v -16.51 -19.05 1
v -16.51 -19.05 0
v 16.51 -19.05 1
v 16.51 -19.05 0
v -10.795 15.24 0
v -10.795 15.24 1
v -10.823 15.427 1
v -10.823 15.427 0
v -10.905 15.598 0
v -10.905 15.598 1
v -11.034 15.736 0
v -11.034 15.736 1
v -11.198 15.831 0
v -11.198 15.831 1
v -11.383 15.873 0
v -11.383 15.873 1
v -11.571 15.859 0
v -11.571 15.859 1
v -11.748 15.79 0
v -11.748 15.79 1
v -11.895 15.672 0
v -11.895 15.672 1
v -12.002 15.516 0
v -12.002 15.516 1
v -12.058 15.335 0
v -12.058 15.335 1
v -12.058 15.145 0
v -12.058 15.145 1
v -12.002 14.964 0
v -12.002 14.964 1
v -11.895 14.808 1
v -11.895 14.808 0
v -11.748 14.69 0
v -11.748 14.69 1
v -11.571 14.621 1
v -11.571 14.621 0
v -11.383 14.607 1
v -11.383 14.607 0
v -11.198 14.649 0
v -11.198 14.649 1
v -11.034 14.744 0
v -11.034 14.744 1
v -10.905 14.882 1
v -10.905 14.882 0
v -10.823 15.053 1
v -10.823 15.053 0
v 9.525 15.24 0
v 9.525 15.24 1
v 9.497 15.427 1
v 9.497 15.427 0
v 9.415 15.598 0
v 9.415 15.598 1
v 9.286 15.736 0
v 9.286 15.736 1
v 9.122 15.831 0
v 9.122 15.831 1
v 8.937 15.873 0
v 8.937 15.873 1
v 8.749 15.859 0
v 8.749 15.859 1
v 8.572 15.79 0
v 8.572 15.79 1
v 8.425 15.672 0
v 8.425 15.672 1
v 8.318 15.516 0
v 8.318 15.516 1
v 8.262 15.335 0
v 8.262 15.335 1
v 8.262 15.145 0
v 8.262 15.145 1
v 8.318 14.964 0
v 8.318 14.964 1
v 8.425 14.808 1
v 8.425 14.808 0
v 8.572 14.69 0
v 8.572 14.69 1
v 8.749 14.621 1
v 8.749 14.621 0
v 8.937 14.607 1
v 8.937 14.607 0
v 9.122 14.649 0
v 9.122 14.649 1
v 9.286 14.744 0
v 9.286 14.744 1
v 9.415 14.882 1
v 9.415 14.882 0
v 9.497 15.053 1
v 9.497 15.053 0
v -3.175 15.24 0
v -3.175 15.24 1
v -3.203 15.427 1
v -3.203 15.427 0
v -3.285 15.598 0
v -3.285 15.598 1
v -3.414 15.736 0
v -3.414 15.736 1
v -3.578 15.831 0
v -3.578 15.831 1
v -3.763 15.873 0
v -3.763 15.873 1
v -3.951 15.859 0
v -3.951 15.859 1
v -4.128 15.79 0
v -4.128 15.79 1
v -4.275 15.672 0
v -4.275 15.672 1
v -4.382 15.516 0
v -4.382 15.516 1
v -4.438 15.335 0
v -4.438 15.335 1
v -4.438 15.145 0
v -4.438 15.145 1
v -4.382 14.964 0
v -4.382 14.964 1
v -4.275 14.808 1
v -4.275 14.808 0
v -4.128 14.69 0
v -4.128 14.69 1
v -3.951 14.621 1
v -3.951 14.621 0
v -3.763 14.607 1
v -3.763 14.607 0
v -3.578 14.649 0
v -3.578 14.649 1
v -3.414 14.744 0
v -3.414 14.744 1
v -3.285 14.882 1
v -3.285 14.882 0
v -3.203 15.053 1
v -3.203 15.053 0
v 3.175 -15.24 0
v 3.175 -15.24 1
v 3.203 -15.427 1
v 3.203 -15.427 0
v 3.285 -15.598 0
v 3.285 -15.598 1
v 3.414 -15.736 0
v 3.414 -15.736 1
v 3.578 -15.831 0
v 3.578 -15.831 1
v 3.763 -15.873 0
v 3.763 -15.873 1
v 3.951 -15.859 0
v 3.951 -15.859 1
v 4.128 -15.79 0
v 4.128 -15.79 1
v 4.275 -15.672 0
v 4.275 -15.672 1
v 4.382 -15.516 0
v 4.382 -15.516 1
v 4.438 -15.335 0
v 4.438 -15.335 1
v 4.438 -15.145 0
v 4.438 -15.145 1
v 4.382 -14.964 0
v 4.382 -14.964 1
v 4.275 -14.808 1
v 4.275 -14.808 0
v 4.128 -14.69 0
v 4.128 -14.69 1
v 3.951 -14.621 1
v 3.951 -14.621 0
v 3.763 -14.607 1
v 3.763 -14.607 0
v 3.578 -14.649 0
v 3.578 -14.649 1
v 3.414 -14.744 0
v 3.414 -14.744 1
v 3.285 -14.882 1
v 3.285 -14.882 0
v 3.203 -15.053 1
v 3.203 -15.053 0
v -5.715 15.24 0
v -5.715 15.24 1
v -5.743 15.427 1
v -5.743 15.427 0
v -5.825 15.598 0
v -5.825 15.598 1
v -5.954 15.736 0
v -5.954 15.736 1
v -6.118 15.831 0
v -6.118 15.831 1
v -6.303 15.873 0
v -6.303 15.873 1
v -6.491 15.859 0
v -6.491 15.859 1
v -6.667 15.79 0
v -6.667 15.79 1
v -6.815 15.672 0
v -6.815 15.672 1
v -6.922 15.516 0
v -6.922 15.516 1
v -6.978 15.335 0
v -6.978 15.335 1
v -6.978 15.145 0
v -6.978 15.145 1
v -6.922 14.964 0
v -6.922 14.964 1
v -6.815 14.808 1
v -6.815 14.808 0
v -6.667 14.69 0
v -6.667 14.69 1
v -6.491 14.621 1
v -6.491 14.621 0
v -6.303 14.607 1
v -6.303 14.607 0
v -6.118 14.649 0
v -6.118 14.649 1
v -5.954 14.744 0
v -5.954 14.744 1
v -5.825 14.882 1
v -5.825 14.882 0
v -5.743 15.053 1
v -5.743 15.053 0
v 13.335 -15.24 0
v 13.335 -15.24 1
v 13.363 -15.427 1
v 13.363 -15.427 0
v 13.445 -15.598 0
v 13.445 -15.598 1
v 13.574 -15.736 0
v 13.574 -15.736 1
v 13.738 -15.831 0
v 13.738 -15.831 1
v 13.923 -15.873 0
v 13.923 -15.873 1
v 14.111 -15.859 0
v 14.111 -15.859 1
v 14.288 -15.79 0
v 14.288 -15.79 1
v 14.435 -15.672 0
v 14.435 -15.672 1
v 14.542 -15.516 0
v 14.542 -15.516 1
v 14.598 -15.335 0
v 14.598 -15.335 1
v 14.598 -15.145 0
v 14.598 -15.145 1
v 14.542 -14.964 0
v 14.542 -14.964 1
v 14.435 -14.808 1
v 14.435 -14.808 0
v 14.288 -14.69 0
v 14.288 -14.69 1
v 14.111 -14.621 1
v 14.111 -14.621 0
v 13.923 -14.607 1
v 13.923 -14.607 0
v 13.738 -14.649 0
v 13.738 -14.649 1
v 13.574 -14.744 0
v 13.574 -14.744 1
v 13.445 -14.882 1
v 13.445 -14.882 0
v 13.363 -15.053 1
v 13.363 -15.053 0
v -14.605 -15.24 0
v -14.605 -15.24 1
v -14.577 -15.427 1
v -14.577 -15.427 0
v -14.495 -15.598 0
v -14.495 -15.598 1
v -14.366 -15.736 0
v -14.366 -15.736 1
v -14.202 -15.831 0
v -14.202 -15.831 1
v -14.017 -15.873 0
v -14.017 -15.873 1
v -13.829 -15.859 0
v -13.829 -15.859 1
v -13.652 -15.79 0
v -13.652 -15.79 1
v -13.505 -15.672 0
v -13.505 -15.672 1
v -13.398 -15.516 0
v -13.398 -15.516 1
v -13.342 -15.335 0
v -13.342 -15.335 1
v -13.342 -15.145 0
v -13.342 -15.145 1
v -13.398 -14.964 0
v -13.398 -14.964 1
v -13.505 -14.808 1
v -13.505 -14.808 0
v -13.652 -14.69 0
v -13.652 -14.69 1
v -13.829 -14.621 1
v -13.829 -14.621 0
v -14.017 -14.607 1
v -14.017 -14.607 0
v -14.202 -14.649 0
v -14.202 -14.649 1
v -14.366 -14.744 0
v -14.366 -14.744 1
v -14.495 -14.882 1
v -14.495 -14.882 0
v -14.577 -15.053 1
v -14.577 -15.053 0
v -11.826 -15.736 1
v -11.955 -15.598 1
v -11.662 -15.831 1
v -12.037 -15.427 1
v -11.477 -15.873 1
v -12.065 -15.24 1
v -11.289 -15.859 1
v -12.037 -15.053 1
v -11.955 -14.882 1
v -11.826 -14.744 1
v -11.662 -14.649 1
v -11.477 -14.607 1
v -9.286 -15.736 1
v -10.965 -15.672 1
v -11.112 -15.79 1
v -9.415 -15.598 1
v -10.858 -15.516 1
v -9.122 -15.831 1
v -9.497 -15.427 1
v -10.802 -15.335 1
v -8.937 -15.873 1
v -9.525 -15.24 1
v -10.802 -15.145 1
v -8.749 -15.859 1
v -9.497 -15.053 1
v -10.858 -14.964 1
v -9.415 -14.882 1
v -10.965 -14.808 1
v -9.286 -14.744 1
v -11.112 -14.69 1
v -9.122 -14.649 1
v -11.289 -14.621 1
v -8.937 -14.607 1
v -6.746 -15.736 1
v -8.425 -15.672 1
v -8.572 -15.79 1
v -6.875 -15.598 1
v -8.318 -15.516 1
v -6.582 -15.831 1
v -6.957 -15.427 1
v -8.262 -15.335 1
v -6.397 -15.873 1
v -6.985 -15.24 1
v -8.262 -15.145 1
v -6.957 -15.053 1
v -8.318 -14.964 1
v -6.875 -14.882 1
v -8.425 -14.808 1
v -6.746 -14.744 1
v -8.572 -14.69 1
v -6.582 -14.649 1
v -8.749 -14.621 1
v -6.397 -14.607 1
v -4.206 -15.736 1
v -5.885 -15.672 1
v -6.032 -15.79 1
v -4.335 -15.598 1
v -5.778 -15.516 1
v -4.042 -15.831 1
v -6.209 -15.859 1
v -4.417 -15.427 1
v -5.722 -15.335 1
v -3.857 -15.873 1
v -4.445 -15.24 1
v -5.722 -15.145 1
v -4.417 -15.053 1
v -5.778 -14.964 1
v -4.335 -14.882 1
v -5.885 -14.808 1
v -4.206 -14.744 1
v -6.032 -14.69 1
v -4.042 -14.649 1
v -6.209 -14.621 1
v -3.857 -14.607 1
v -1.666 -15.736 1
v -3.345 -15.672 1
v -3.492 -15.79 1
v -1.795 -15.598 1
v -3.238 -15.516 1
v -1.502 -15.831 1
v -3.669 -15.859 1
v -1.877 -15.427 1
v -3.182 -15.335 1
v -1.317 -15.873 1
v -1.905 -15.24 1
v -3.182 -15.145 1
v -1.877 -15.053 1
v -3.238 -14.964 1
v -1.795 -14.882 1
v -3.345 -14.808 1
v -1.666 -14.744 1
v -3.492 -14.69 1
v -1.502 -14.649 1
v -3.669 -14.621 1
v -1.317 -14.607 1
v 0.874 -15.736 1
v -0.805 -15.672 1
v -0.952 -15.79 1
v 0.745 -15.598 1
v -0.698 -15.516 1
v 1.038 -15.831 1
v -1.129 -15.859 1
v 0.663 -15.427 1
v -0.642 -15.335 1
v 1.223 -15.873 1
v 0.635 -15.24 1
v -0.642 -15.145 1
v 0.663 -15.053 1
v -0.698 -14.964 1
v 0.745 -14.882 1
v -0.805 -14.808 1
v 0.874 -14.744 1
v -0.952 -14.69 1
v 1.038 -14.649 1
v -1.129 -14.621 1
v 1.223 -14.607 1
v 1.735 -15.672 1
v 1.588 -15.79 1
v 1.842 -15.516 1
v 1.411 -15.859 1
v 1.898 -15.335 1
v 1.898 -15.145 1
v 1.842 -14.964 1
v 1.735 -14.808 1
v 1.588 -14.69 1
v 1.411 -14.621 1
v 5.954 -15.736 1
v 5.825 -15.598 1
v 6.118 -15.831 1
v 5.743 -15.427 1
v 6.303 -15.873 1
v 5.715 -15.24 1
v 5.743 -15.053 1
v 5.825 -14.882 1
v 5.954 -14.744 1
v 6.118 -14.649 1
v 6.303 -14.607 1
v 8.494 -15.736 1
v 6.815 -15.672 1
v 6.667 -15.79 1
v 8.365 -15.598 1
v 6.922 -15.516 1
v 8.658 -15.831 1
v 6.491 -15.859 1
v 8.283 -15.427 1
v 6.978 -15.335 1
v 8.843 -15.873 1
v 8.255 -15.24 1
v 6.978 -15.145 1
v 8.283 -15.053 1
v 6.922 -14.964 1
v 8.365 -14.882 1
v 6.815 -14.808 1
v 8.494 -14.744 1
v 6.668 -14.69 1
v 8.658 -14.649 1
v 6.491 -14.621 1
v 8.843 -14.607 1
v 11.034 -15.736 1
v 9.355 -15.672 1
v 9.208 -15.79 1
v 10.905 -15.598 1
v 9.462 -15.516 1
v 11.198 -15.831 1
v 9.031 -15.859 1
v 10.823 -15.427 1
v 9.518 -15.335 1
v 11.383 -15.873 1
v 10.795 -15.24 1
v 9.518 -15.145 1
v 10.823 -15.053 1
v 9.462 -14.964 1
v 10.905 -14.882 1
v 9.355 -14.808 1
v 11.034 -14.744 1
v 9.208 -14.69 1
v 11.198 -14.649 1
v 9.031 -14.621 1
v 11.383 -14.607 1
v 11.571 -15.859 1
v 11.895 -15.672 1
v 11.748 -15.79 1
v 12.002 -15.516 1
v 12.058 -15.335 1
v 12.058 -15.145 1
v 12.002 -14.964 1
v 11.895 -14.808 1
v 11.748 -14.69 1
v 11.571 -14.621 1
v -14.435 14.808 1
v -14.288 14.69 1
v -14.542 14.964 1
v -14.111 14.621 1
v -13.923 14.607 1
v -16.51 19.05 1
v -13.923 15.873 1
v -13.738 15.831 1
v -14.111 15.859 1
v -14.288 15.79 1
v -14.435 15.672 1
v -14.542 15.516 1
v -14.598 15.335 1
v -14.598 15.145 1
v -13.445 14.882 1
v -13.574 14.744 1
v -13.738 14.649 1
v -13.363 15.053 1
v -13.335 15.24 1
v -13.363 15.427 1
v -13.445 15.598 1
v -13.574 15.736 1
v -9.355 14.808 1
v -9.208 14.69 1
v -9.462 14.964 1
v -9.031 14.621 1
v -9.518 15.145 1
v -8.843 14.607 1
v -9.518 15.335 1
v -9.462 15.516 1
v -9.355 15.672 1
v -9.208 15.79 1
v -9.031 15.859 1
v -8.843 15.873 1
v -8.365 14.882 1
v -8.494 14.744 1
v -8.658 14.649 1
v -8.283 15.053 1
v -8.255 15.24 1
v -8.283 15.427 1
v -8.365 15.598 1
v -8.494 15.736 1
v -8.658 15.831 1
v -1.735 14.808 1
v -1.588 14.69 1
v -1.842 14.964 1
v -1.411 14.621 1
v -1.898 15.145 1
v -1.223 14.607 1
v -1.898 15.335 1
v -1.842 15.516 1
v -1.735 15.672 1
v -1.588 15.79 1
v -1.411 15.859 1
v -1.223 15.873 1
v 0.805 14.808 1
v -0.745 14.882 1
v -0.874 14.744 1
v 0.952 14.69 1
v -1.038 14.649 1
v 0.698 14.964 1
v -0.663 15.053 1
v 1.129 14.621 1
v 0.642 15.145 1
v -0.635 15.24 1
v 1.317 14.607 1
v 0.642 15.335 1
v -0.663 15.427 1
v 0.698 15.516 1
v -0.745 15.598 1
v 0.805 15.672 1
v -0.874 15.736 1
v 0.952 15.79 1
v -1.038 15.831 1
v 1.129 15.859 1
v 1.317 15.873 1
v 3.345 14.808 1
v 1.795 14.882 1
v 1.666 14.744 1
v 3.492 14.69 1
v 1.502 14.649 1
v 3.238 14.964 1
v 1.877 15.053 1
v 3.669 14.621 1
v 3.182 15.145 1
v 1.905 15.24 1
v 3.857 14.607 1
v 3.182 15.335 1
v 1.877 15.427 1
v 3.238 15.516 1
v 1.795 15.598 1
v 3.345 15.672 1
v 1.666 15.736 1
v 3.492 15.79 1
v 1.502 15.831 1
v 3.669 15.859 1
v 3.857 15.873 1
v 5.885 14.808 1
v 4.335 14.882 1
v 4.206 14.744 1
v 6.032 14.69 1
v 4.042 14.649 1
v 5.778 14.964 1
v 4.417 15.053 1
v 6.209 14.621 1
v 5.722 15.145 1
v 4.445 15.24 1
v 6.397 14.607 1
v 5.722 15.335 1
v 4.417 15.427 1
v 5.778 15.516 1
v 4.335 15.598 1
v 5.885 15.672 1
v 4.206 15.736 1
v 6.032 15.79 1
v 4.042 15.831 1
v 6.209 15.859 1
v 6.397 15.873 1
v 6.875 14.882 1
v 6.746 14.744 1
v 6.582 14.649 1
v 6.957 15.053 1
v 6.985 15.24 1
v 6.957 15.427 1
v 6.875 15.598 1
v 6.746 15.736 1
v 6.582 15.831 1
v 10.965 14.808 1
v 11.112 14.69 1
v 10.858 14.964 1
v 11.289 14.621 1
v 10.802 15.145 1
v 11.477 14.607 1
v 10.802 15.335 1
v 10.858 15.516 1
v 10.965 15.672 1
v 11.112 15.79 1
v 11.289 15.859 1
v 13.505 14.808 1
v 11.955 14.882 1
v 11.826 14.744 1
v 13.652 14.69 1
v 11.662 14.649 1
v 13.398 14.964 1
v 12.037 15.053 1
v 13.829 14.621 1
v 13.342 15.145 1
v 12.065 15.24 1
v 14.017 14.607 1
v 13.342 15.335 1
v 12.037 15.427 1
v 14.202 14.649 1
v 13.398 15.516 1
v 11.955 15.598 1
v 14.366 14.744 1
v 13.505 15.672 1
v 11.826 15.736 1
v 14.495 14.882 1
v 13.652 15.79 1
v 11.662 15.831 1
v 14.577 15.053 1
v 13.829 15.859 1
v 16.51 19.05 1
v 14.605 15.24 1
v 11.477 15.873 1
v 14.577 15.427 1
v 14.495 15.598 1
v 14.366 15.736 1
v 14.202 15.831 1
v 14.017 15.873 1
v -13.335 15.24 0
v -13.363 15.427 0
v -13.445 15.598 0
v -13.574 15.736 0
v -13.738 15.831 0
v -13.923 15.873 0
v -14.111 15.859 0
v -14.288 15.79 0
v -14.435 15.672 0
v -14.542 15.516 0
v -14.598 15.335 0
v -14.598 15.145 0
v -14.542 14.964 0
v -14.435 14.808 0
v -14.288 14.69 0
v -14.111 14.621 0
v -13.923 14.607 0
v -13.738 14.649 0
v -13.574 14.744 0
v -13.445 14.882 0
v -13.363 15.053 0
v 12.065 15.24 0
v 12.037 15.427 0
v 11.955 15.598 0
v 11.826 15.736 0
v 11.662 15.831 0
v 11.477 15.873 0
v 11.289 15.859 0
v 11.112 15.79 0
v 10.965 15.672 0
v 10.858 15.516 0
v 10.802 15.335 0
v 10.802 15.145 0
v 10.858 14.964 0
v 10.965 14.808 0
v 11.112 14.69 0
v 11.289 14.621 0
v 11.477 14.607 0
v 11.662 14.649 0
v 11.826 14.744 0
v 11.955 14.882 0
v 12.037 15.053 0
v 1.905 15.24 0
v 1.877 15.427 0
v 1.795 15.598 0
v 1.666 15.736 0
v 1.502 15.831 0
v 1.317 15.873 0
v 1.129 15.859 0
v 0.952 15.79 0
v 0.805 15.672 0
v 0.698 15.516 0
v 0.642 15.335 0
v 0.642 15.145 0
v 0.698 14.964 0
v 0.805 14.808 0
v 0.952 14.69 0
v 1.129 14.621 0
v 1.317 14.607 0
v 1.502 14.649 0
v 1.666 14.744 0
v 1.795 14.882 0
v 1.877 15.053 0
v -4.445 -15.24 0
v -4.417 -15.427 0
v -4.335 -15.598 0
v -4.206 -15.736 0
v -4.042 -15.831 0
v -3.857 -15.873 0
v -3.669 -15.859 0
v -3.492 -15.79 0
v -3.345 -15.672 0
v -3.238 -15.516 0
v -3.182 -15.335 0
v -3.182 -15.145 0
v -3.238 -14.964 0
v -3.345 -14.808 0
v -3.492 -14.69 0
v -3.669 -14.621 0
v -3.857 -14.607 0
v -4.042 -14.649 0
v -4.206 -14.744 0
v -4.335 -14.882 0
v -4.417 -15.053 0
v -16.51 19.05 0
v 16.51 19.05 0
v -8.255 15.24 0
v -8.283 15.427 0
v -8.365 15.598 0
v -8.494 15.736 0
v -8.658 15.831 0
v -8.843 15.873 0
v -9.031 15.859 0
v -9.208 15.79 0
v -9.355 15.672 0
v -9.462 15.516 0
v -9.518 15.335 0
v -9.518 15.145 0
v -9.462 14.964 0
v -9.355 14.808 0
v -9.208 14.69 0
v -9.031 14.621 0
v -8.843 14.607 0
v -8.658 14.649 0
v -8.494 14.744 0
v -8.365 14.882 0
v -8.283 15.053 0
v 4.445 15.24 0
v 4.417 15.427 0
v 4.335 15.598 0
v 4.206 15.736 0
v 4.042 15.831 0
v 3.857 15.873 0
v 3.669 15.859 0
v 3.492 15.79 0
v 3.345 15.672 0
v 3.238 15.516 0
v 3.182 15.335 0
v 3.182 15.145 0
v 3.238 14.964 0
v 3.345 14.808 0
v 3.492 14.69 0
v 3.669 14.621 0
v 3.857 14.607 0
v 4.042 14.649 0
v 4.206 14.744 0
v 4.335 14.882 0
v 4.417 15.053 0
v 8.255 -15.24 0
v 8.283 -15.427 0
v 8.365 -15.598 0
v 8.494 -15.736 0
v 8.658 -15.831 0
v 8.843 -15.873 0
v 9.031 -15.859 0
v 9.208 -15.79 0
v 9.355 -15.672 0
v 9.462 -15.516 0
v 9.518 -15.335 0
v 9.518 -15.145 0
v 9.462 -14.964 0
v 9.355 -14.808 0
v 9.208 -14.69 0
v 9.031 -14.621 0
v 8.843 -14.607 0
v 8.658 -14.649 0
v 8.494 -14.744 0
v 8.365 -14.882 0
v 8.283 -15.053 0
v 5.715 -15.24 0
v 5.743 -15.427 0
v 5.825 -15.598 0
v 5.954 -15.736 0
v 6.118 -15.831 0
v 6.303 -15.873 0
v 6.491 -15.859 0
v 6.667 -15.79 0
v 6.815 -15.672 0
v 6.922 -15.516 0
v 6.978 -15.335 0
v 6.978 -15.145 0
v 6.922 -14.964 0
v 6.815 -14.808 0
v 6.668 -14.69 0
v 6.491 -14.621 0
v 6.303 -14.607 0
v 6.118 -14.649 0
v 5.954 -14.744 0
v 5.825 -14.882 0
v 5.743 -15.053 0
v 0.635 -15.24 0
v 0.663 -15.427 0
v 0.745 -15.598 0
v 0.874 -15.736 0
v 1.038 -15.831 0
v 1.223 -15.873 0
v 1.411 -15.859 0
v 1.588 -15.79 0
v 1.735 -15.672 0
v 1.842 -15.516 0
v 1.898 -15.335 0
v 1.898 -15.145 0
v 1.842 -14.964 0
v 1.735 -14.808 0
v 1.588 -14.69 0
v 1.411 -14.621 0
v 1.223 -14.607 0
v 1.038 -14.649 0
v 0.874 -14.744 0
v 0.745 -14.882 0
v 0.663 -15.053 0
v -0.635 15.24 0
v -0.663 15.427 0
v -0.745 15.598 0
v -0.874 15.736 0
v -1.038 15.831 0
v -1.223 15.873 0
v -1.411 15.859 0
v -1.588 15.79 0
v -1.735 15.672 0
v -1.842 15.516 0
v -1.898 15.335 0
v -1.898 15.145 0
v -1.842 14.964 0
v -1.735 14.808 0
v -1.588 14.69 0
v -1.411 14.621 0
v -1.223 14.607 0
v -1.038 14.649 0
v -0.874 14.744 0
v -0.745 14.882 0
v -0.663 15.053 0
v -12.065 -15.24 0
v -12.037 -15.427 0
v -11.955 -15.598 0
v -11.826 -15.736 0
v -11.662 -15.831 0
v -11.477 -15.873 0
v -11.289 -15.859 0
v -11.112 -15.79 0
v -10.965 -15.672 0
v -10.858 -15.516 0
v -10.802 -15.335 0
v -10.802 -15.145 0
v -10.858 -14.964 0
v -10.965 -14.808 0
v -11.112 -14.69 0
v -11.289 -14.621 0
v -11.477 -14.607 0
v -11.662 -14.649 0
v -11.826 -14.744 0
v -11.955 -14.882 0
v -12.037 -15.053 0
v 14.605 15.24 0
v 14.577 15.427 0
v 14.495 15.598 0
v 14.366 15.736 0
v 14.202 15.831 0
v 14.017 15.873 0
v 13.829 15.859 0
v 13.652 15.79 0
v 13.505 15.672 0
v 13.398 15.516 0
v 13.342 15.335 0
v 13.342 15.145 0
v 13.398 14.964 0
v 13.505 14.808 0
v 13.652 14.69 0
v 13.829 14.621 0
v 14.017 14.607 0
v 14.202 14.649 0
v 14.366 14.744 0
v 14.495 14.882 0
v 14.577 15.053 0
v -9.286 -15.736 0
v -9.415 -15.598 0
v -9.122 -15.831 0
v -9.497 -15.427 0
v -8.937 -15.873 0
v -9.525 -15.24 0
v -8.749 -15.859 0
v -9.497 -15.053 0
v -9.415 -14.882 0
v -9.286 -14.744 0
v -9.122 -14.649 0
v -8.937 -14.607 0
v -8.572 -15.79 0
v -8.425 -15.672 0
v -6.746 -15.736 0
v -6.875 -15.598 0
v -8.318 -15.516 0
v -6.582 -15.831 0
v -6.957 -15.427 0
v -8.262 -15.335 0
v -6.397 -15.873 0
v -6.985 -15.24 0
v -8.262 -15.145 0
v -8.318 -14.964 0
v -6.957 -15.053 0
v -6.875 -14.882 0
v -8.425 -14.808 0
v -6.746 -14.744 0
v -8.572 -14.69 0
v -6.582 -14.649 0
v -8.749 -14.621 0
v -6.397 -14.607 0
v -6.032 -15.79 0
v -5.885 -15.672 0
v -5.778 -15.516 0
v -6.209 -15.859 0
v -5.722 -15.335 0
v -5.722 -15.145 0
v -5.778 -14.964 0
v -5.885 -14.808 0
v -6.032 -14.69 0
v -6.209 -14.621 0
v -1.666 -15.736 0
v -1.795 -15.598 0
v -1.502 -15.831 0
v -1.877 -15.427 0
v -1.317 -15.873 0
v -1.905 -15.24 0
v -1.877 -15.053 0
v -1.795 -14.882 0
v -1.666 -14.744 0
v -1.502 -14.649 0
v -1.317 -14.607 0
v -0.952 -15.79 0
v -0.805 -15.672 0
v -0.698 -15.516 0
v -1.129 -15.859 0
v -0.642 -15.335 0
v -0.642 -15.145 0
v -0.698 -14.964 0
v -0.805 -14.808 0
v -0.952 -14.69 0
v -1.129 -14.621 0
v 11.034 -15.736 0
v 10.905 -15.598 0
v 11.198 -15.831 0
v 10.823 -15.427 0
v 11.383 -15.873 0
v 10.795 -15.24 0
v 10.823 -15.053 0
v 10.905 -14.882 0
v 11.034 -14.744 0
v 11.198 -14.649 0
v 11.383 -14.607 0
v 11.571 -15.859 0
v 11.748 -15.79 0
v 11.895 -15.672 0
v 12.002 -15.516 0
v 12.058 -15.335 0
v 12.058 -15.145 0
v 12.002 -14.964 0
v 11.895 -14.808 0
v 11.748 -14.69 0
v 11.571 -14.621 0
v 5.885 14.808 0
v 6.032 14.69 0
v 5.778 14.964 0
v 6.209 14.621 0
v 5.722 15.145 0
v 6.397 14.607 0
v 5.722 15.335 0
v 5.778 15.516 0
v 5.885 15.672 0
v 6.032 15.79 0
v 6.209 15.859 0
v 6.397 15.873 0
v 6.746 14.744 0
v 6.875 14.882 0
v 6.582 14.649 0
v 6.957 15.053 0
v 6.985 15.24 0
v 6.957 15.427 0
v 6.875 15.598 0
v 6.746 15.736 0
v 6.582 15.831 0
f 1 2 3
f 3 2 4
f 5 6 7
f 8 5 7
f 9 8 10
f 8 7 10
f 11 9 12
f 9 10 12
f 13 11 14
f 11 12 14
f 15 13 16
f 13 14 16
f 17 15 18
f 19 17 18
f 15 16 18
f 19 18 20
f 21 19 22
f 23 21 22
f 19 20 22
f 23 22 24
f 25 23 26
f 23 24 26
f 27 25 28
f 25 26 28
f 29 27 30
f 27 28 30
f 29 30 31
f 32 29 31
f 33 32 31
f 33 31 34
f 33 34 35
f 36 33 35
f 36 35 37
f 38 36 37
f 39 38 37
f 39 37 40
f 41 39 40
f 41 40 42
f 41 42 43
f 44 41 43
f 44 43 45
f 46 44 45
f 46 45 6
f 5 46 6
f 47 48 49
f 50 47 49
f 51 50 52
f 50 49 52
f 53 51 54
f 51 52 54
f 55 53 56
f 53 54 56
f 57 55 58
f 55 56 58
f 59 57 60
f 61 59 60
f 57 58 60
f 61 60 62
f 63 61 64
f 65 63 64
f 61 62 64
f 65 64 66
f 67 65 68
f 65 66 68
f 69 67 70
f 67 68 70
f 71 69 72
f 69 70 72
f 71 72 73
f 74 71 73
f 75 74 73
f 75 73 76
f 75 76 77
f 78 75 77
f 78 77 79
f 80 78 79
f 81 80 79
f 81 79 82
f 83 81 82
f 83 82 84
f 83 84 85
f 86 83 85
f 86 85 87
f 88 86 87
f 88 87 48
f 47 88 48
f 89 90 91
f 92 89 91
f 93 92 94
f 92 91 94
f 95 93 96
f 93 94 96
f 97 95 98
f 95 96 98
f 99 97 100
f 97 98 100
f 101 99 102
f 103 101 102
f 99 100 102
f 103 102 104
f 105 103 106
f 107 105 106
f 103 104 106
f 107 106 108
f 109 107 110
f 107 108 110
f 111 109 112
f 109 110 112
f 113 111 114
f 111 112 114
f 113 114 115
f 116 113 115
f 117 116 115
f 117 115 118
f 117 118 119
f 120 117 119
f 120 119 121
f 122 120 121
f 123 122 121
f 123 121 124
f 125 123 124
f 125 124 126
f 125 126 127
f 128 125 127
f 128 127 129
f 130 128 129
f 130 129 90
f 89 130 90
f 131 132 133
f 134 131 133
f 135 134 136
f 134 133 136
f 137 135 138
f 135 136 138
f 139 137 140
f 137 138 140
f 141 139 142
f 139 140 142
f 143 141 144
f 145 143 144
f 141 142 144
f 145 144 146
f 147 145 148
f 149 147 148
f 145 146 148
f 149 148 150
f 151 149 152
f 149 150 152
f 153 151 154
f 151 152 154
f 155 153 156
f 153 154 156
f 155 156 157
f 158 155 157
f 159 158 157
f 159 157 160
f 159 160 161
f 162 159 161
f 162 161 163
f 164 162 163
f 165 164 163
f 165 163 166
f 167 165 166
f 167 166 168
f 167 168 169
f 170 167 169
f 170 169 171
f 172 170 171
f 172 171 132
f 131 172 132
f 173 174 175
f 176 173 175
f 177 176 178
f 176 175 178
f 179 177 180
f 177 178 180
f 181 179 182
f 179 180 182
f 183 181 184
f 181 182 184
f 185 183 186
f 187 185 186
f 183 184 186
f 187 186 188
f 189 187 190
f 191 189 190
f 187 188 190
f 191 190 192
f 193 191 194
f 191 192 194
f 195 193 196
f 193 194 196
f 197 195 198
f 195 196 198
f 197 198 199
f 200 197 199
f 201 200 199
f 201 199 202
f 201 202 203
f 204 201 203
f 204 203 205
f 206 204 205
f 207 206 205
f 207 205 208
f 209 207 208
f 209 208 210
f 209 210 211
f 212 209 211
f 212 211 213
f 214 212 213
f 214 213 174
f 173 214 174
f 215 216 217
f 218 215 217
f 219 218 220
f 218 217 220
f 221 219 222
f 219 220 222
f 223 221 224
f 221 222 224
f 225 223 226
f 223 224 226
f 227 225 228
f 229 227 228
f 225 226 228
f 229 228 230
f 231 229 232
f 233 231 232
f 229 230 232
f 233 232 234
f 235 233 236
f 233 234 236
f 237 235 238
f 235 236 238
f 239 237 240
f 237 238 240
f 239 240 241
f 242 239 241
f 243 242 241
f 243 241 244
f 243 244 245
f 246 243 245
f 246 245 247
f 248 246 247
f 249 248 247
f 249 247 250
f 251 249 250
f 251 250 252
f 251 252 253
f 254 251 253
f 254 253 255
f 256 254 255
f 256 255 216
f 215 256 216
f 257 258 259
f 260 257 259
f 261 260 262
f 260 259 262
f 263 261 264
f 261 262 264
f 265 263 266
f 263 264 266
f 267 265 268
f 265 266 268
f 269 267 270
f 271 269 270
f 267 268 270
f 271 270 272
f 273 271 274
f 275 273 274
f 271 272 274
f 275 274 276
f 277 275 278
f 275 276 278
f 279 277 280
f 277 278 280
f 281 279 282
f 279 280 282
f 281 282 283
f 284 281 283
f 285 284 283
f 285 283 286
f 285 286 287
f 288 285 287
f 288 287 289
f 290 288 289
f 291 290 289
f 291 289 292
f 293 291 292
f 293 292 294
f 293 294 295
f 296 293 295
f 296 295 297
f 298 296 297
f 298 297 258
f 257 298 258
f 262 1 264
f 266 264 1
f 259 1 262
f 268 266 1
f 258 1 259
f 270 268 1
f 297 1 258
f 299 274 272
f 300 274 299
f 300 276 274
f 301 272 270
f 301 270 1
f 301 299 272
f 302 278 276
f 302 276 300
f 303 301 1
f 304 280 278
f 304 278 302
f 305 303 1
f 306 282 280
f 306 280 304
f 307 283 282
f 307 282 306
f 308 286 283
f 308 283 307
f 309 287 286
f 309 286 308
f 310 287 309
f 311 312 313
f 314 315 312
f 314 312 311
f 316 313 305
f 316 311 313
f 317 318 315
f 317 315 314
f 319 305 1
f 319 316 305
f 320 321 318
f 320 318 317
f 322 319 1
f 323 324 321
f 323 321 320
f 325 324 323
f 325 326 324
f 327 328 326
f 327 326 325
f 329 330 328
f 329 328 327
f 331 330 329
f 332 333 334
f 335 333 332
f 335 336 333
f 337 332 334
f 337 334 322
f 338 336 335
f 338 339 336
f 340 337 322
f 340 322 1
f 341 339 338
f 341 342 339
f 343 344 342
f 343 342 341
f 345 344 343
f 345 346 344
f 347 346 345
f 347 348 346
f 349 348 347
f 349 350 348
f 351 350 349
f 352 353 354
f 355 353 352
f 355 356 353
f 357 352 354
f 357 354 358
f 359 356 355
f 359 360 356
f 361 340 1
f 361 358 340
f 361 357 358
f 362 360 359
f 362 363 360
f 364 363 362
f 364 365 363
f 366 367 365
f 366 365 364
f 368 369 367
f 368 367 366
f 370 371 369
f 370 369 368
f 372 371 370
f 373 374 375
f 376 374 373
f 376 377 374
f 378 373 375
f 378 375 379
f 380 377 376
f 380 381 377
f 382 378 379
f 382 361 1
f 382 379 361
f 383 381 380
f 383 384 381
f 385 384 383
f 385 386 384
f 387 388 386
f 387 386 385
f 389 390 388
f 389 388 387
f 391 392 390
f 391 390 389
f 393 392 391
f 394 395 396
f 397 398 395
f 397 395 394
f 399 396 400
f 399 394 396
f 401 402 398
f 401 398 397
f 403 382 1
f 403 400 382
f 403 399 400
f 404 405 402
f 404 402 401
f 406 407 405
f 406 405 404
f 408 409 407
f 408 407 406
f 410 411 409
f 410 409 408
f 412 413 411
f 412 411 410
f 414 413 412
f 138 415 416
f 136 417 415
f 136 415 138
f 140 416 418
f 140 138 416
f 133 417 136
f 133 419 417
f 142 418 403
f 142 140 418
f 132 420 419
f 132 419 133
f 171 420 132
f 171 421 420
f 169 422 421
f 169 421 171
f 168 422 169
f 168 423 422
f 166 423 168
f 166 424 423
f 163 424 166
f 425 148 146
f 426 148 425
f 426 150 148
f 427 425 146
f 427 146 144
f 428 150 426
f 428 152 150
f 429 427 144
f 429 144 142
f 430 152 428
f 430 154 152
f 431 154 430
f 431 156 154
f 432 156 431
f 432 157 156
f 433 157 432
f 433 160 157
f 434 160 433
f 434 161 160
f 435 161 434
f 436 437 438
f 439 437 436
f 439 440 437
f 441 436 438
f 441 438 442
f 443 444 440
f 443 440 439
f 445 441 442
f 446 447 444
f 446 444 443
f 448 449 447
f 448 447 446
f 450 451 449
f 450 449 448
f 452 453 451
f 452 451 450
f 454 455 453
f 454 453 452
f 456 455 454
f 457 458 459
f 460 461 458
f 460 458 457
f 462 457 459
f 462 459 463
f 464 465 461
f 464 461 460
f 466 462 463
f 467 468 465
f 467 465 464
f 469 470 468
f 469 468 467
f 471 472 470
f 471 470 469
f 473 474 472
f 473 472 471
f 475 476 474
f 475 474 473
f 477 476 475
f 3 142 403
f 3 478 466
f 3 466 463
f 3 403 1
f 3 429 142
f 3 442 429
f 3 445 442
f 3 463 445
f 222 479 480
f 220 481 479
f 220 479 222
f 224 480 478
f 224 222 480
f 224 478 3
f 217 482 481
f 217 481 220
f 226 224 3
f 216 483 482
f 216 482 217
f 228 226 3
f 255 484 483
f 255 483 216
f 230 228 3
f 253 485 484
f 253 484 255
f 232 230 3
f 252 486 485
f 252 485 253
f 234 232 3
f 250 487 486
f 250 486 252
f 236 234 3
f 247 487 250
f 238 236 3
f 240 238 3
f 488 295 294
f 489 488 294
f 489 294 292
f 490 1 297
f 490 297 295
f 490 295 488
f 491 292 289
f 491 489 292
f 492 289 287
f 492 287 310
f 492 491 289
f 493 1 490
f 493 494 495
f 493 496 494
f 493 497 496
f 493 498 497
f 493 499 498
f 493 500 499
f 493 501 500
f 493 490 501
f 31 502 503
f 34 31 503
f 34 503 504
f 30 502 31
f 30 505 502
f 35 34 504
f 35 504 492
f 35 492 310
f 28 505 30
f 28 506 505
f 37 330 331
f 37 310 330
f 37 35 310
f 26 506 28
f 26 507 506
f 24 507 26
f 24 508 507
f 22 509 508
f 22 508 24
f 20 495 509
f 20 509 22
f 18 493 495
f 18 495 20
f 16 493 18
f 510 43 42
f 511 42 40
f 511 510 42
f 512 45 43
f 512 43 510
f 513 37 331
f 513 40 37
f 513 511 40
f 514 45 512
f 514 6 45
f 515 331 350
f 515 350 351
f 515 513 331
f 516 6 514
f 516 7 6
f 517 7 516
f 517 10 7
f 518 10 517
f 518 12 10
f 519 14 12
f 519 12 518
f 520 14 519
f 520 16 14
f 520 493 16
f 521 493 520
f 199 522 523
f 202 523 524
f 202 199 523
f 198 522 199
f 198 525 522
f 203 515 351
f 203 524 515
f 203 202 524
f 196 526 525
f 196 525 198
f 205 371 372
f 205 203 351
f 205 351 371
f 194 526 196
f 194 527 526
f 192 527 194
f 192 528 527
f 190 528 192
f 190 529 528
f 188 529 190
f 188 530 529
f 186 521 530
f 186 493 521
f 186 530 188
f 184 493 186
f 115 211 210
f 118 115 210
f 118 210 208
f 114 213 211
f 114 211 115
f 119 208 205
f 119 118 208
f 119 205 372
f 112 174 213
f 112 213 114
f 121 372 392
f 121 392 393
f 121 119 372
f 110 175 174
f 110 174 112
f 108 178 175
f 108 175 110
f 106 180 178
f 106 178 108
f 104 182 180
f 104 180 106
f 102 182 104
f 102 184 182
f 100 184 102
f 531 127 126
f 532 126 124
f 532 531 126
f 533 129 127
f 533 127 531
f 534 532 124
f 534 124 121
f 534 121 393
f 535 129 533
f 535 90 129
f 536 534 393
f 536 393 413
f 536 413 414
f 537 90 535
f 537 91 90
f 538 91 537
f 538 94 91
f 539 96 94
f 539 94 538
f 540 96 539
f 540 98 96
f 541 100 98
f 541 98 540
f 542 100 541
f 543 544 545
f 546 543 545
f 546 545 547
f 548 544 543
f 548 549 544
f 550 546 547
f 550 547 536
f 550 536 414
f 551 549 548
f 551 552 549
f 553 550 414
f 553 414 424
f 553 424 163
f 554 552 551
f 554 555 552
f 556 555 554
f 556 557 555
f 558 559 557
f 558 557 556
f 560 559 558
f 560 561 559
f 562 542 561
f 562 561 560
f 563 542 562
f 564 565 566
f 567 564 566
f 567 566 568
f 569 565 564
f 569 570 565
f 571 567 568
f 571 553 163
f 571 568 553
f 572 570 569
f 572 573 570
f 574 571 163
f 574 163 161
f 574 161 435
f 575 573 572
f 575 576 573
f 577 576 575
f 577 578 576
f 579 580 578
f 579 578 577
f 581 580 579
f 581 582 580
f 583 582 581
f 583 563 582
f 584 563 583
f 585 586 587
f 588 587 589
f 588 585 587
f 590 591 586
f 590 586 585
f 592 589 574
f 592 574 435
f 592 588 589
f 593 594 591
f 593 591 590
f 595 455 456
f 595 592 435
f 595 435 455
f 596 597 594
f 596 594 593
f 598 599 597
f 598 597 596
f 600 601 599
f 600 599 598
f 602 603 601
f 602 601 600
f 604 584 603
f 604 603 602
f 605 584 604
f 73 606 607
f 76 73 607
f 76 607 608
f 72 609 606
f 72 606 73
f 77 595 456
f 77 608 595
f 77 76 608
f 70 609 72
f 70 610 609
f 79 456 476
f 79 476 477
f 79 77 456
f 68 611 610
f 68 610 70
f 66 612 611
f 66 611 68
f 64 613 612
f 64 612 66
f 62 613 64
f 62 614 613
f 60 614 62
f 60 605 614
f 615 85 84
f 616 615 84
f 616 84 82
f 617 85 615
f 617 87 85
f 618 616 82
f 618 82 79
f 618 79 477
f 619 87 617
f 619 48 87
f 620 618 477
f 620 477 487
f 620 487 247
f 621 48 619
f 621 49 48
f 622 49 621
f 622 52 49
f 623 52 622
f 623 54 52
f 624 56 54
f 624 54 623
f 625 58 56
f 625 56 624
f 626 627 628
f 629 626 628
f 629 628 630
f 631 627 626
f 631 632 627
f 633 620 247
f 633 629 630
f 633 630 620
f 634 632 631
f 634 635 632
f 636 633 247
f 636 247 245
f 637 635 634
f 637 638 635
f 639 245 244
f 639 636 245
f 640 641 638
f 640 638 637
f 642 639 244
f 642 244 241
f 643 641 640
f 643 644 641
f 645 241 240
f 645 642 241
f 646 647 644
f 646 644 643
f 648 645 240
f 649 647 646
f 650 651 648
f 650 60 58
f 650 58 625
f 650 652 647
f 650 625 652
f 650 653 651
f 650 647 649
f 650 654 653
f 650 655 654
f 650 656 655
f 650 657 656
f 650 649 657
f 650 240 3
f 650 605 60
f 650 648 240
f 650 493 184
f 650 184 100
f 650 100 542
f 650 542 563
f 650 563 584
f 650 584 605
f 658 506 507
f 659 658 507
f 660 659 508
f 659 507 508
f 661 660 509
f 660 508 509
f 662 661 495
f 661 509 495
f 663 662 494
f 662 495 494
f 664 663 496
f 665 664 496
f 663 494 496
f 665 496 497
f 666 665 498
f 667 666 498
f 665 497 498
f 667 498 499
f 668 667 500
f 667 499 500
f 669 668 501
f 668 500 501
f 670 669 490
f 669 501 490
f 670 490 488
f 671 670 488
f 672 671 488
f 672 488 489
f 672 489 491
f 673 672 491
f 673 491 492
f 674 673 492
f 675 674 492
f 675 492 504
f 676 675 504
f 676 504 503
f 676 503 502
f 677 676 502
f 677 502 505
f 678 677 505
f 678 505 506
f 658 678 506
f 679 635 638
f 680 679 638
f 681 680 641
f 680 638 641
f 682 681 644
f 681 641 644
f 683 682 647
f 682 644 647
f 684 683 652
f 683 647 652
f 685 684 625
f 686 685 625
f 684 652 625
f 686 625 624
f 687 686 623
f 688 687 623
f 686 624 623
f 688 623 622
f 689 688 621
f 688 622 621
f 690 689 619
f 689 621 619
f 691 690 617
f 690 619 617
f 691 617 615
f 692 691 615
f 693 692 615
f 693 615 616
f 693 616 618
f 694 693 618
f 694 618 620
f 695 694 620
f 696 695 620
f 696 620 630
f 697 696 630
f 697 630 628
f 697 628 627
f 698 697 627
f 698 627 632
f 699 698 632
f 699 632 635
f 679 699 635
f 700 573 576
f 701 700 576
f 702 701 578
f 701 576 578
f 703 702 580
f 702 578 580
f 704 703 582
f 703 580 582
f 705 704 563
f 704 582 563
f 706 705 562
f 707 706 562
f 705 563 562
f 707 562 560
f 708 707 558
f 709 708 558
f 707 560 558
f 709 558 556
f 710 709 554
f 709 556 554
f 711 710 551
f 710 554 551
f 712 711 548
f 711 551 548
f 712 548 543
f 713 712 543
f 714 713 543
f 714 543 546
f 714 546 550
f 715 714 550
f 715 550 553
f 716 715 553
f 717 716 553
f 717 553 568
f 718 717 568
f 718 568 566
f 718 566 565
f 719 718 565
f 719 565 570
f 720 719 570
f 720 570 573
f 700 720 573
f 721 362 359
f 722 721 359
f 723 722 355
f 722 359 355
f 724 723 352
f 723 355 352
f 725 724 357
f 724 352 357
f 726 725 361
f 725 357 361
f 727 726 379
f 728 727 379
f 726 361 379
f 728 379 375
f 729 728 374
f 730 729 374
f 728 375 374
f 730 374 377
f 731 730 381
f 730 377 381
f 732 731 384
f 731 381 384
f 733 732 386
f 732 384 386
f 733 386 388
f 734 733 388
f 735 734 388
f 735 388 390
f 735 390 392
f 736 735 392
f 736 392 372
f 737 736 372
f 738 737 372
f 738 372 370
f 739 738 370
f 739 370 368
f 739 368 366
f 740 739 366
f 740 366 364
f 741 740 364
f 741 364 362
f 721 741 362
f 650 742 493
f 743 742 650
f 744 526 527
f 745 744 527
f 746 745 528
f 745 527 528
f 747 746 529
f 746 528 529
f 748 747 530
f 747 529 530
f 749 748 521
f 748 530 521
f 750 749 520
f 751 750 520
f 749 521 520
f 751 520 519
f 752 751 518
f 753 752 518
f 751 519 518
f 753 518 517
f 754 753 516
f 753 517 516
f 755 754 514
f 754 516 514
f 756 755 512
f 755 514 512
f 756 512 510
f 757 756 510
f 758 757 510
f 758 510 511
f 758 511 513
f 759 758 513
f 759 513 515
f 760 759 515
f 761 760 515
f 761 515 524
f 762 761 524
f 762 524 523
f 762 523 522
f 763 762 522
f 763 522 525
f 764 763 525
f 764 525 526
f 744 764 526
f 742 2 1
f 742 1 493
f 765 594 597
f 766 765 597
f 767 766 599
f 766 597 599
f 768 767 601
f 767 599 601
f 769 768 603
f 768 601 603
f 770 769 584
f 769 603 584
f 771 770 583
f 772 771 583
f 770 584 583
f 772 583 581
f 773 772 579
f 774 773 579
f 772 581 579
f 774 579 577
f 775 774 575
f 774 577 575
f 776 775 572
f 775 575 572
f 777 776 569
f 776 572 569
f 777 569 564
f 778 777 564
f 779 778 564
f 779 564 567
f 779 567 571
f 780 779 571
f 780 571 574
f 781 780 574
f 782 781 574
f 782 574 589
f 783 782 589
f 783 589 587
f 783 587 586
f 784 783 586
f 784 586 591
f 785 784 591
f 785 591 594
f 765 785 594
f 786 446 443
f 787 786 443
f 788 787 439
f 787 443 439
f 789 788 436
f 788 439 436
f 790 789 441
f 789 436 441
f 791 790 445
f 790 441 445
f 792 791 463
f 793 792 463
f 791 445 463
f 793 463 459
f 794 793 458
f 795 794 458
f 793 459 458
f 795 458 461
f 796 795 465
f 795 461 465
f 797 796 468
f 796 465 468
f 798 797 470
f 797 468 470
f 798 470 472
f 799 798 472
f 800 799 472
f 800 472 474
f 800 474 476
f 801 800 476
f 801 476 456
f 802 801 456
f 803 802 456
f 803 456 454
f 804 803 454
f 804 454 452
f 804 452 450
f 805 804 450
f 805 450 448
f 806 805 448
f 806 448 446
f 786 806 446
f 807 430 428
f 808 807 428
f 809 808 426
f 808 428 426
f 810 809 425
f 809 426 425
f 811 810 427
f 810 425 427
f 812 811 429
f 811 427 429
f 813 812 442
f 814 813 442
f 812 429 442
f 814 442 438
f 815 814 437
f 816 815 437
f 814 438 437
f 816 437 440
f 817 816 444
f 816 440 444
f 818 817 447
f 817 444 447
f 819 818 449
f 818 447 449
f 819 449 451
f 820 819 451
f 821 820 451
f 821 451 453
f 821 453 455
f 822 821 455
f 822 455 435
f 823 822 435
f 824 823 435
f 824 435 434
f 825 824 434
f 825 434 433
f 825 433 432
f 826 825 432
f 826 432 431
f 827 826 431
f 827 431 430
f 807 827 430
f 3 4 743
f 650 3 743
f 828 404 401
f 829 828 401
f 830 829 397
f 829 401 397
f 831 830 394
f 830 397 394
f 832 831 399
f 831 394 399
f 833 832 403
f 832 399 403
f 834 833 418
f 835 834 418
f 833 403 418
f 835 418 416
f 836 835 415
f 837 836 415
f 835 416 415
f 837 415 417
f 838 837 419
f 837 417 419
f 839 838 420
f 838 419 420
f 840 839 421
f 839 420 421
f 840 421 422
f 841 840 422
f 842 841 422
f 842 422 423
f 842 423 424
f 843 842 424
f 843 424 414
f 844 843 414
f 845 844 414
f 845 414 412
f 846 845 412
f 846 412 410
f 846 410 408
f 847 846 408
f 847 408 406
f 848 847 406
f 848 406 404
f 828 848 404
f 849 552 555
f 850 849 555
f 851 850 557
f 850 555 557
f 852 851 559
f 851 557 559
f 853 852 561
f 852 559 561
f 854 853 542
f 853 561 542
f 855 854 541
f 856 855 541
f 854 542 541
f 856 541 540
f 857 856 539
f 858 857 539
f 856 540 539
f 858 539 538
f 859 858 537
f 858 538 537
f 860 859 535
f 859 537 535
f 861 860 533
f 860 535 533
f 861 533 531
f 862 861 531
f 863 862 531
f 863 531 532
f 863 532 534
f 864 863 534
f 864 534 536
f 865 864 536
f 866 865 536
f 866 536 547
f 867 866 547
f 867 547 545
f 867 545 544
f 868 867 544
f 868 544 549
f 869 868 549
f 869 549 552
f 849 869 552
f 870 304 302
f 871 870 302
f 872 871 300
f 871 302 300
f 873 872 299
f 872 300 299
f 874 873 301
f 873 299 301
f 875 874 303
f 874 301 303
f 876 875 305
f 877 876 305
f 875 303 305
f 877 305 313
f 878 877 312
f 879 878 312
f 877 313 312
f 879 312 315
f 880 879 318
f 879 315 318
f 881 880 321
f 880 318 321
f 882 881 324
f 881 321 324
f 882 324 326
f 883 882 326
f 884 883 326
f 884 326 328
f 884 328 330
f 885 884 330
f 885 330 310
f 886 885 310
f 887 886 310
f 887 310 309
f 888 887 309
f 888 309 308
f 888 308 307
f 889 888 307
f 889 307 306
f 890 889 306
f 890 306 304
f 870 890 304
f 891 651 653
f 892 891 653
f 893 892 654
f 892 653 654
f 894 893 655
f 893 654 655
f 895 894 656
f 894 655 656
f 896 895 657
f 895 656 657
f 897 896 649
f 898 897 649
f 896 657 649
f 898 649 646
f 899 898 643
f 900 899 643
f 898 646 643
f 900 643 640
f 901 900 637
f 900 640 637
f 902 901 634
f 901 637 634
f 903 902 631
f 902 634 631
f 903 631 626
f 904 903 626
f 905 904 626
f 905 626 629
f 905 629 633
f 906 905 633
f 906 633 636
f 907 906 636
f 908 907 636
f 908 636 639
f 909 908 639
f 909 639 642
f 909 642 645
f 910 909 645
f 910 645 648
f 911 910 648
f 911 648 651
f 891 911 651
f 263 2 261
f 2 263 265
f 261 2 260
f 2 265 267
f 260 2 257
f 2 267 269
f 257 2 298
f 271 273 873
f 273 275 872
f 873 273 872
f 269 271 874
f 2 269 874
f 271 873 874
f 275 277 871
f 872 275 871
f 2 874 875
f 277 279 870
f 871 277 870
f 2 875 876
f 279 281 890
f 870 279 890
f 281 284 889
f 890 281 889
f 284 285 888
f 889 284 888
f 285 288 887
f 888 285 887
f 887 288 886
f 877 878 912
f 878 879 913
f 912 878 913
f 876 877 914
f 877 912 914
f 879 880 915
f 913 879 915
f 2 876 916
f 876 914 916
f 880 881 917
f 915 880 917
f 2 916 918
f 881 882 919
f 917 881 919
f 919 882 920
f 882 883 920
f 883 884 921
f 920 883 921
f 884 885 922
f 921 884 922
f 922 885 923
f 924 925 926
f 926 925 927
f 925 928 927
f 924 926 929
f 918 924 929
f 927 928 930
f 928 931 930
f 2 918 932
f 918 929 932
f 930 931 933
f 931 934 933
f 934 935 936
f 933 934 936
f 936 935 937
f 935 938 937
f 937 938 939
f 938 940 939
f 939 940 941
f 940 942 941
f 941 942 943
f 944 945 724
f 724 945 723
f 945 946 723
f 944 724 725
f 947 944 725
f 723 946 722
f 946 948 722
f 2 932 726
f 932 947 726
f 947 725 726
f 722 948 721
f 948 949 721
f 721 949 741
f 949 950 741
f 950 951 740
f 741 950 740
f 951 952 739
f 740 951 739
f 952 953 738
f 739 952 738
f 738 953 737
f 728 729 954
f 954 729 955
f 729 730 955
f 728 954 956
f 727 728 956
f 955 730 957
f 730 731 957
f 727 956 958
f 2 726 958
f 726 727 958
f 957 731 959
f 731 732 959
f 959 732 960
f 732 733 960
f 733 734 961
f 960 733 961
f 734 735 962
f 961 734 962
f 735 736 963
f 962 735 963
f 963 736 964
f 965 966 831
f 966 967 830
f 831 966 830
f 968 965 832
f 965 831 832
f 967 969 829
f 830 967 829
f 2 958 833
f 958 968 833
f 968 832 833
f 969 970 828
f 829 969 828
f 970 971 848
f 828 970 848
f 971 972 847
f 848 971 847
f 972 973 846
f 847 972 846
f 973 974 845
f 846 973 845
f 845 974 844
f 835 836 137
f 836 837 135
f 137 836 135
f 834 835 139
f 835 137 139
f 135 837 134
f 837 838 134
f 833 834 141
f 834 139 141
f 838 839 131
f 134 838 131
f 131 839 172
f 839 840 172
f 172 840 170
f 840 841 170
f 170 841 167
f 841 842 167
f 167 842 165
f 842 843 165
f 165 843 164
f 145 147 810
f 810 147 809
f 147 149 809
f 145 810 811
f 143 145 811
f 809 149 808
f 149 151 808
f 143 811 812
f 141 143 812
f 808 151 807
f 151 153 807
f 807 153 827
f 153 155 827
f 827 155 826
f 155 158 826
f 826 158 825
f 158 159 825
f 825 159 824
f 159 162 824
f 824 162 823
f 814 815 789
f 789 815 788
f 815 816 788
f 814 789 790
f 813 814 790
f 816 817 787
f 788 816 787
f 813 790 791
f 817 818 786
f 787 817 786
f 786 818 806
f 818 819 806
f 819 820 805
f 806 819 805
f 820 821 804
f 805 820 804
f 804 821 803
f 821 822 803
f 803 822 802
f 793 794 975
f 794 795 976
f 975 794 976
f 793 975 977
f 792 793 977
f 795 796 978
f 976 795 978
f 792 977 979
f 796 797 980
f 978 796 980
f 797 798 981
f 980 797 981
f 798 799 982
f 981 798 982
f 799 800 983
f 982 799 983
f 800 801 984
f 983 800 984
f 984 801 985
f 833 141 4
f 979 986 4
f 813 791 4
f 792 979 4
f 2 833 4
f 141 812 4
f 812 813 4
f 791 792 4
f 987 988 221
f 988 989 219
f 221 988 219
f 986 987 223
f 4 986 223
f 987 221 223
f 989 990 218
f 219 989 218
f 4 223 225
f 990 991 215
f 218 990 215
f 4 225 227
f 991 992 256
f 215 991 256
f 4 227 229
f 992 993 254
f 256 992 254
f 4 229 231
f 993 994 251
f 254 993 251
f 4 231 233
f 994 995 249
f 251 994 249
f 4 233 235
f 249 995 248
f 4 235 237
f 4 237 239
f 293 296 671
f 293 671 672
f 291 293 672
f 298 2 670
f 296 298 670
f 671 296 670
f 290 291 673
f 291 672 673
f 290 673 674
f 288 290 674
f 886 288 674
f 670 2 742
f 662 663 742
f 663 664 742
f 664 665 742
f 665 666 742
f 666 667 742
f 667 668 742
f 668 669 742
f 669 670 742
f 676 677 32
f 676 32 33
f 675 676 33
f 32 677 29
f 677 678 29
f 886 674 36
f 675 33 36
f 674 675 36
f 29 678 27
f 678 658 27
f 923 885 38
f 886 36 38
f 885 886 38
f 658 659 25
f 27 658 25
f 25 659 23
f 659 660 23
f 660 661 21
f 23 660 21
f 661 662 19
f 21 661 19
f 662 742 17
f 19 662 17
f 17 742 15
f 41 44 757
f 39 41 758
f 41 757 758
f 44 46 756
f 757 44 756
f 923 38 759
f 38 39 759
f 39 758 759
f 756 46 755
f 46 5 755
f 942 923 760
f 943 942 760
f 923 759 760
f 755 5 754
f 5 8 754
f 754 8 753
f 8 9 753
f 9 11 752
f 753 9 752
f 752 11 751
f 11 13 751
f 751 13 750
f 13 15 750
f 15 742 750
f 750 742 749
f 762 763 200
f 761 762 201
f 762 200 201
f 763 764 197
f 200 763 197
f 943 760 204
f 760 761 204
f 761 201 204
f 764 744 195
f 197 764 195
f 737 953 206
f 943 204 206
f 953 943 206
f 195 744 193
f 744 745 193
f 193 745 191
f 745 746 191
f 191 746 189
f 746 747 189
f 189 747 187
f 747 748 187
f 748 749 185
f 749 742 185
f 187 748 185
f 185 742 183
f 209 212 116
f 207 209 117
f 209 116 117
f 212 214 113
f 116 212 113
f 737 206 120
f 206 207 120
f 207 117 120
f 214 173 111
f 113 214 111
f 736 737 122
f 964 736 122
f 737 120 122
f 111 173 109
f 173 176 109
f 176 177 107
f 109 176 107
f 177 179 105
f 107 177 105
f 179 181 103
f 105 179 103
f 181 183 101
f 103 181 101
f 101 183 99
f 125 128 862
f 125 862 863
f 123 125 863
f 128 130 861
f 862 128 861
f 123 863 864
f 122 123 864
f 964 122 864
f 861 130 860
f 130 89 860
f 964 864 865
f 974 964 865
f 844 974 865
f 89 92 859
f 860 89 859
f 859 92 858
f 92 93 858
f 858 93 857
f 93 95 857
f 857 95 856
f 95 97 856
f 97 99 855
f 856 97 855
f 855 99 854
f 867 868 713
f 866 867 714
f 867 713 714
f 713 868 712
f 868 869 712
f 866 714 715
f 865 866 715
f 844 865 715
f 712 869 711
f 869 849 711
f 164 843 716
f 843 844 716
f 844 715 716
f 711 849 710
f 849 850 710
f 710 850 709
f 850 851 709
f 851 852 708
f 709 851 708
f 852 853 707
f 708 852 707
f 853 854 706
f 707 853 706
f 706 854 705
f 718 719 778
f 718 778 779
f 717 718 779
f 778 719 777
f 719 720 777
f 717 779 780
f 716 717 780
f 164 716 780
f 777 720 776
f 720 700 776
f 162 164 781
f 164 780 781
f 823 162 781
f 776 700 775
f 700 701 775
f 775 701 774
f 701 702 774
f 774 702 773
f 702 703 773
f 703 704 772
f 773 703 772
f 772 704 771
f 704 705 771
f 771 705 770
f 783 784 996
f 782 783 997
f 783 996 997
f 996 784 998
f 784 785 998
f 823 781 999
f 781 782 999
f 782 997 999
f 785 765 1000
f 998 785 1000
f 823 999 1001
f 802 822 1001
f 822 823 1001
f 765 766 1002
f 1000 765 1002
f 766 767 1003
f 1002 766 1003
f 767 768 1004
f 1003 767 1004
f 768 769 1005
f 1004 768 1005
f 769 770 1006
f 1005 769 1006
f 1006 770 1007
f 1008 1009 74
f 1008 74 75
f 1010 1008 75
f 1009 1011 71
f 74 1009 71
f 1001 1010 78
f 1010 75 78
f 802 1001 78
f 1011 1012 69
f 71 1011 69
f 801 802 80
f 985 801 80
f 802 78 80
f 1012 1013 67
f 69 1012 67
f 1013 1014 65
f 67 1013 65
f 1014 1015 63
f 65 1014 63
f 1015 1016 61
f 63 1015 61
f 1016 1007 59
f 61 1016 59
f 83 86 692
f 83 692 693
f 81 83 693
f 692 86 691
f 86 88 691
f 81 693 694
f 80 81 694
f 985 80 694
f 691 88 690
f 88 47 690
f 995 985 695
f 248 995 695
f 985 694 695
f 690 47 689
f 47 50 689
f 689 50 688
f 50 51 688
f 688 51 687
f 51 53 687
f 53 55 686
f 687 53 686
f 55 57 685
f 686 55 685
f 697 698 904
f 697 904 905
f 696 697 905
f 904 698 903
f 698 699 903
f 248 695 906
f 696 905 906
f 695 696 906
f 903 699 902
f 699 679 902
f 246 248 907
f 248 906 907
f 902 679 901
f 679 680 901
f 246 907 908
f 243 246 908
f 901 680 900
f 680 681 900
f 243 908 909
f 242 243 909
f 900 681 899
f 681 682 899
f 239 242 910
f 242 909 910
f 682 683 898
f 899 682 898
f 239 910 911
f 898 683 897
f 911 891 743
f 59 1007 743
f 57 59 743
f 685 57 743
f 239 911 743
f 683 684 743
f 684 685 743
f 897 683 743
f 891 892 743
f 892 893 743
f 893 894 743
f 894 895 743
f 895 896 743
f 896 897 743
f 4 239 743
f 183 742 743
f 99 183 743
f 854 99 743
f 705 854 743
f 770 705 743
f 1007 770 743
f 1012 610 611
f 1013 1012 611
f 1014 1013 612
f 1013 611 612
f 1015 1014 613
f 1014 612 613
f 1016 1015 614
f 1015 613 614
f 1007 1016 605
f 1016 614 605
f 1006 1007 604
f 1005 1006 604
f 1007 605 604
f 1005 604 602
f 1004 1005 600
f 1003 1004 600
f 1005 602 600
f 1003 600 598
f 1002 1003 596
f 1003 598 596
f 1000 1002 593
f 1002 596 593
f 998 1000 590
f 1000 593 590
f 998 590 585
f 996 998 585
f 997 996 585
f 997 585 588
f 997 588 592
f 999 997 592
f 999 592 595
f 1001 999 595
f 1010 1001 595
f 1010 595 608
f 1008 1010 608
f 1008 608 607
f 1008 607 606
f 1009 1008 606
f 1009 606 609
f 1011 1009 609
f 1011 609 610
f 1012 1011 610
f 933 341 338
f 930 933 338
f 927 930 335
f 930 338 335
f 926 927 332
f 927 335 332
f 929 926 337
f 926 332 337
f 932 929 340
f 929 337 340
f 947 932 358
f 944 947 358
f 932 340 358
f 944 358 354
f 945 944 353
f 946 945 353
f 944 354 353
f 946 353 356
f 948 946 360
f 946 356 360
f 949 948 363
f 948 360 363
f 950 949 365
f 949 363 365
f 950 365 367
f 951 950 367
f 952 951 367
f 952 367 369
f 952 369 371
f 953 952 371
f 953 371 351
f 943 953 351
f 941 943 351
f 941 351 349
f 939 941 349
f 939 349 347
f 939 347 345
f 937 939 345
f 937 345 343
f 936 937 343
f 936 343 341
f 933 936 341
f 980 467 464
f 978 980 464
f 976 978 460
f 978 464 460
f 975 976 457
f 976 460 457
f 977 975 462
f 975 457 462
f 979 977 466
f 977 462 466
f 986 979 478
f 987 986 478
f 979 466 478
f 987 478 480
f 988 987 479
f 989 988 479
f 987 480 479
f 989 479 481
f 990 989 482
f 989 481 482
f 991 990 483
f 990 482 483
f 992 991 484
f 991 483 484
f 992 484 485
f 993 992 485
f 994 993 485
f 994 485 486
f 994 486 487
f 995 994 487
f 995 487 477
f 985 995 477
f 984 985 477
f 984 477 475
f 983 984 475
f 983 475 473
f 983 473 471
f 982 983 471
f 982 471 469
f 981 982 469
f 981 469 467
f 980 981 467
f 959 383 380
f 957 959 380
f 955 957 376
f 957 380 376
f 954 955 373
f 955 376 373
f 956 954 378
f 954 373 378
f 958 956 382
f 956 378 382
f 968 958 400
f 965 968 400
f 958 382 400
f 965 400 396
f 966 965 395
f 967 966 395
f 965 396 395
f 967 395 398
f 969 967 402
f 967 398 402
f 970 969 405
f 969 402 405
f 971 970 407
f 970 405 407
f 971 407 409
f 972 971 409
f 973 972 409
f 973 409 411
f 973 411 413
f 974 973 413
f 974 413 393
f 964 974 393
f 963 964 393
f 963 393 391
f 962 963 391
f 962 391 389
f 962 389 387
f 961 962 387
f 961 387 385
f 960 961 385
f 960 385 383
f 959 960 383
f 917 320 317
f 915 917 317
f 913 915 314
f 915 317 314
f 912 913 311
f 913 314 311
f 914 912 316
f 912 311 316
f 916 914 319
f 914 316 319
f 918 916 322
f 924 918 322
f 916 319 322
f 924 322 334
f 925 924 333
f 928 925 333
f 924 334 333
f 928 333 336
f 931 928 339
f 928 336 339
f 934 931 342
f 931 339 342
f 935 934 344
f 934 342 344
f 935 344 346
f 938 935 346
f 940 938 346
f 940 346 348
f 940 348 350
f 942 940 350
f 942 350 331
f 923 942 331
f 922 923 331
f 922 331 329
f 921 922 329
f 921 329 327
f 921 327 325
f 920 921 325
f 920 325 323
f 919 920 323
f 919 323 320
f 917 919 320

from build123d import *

# Parameters (mm, degrees)
CROQUIS1_W              = 33.02
CROQUIS1_H              = 38.1
SALIENTE_EXTRUIR1_DEPTH = 1
CROQUIS2_R              = 0.635
CORTAR_EXTRUIR1_DEPTH   = 26.228606779


with BuildPart() as part:
    # Croquis1 → Saliente-Extruir1 (new body)
    with BuildSketch(Plane.XY):
        Rectangle(CROQUIS1_W, CROQUIS1_H)
    extrude(amount=SALIENTE_EXTRUIR1_DEPTH)

    # Croquis2 → Cortar-Extruir1 (cut, through all)
    with BuildSketch(Plane.XY.offset(1)):
        with Locations((-13.97, 15.24)):
            Circle(CROQUIS2_R)
        with Locations((-11.43, 15.24)):
            Circle(CROQUIS2_R)
        with Locations((-8.89, 15.24)):
            Circle(CROQUIS2_R)
        with Locations((-6.35, 15.24)):
            Circle(CROQUIS2_R)
        with Locations((-3.81, 15.24)):
            Circle(CROQUIS2_R)
        with Locations((-1.27, 15.24)):
            Circle(CROQUIS2_R)
        with Locations((1.27, 15.24)):
            Circle(CROQUIS2_R)
        with Locations((3.81, 15.24)):
            Circle(CROQUIS2_R)
        with Locations((6.35, 15.24)):
            Circle(CROQUIS2_R)
        with Locations((8.89, 15.24)):
            Circle(CROQUIS2_R)
        with Locations((11.43, 15.24)):
            Circle(CROQUIS2_R)
        with Locations((13.97, 15.24)):
            Circle(CROQUIS2_R)
        with Locations(Location((13.97, -15.24, 0), (0, 0, 180))):
            Circle(CROQUIS2_R)
        with Locations(Location((11.43, -15.24, 0), (0, 0, 180))):
            Circle(CROQUIS2_R)
        with Locations(Location((8.89, -15.24, 0), (0, 0, 180))):
            Circle(CROQUIS2_R)
        with Locations(Location((6.35, -15.24, 0), (0, 0, 180))):
            Circle(CROQUIS2_R)
        with Locations(Location((3.81, -15.24, 0), (0, 0, 180))):
            Circle(CROQUIS2_R)
        with Locations(Location((1.27, -15.24, 0), (0, 0, 180))):
            Circle(CROQUIS2_R)
        with Locations(Location((-1.27, -15.24, 0), (0, 0, 180))):
            Circle(CROQUIS2_R)
        with Locations(Location((-3.81, -15.24, 0), (0, 0, 180))):
            Circle(CROQUIS2_R)
        with Locations(Location((-6.35, -15.24, 0), (0, 0, 180))):
            Circle(CROQUIS2_R)
        with Locations(Location((-8.89, -15.24, 0), (0, 0, 180))):
            Circle(CROQUIS2_R)
        with Locations(Location((-11.43, -15.24, 0), (0, 0, 180))):
            Circle(CROQUIS2_R)
        with Locations(Location((-13.97, -15.24, 0), (0, 0, 180))):
            Circle(CROQUIS2_R)
    extrude(amount=-CORTAR_EXTRUIR1_DEPTH, mode=Mode.SUBTRACT)


solid = part.part
